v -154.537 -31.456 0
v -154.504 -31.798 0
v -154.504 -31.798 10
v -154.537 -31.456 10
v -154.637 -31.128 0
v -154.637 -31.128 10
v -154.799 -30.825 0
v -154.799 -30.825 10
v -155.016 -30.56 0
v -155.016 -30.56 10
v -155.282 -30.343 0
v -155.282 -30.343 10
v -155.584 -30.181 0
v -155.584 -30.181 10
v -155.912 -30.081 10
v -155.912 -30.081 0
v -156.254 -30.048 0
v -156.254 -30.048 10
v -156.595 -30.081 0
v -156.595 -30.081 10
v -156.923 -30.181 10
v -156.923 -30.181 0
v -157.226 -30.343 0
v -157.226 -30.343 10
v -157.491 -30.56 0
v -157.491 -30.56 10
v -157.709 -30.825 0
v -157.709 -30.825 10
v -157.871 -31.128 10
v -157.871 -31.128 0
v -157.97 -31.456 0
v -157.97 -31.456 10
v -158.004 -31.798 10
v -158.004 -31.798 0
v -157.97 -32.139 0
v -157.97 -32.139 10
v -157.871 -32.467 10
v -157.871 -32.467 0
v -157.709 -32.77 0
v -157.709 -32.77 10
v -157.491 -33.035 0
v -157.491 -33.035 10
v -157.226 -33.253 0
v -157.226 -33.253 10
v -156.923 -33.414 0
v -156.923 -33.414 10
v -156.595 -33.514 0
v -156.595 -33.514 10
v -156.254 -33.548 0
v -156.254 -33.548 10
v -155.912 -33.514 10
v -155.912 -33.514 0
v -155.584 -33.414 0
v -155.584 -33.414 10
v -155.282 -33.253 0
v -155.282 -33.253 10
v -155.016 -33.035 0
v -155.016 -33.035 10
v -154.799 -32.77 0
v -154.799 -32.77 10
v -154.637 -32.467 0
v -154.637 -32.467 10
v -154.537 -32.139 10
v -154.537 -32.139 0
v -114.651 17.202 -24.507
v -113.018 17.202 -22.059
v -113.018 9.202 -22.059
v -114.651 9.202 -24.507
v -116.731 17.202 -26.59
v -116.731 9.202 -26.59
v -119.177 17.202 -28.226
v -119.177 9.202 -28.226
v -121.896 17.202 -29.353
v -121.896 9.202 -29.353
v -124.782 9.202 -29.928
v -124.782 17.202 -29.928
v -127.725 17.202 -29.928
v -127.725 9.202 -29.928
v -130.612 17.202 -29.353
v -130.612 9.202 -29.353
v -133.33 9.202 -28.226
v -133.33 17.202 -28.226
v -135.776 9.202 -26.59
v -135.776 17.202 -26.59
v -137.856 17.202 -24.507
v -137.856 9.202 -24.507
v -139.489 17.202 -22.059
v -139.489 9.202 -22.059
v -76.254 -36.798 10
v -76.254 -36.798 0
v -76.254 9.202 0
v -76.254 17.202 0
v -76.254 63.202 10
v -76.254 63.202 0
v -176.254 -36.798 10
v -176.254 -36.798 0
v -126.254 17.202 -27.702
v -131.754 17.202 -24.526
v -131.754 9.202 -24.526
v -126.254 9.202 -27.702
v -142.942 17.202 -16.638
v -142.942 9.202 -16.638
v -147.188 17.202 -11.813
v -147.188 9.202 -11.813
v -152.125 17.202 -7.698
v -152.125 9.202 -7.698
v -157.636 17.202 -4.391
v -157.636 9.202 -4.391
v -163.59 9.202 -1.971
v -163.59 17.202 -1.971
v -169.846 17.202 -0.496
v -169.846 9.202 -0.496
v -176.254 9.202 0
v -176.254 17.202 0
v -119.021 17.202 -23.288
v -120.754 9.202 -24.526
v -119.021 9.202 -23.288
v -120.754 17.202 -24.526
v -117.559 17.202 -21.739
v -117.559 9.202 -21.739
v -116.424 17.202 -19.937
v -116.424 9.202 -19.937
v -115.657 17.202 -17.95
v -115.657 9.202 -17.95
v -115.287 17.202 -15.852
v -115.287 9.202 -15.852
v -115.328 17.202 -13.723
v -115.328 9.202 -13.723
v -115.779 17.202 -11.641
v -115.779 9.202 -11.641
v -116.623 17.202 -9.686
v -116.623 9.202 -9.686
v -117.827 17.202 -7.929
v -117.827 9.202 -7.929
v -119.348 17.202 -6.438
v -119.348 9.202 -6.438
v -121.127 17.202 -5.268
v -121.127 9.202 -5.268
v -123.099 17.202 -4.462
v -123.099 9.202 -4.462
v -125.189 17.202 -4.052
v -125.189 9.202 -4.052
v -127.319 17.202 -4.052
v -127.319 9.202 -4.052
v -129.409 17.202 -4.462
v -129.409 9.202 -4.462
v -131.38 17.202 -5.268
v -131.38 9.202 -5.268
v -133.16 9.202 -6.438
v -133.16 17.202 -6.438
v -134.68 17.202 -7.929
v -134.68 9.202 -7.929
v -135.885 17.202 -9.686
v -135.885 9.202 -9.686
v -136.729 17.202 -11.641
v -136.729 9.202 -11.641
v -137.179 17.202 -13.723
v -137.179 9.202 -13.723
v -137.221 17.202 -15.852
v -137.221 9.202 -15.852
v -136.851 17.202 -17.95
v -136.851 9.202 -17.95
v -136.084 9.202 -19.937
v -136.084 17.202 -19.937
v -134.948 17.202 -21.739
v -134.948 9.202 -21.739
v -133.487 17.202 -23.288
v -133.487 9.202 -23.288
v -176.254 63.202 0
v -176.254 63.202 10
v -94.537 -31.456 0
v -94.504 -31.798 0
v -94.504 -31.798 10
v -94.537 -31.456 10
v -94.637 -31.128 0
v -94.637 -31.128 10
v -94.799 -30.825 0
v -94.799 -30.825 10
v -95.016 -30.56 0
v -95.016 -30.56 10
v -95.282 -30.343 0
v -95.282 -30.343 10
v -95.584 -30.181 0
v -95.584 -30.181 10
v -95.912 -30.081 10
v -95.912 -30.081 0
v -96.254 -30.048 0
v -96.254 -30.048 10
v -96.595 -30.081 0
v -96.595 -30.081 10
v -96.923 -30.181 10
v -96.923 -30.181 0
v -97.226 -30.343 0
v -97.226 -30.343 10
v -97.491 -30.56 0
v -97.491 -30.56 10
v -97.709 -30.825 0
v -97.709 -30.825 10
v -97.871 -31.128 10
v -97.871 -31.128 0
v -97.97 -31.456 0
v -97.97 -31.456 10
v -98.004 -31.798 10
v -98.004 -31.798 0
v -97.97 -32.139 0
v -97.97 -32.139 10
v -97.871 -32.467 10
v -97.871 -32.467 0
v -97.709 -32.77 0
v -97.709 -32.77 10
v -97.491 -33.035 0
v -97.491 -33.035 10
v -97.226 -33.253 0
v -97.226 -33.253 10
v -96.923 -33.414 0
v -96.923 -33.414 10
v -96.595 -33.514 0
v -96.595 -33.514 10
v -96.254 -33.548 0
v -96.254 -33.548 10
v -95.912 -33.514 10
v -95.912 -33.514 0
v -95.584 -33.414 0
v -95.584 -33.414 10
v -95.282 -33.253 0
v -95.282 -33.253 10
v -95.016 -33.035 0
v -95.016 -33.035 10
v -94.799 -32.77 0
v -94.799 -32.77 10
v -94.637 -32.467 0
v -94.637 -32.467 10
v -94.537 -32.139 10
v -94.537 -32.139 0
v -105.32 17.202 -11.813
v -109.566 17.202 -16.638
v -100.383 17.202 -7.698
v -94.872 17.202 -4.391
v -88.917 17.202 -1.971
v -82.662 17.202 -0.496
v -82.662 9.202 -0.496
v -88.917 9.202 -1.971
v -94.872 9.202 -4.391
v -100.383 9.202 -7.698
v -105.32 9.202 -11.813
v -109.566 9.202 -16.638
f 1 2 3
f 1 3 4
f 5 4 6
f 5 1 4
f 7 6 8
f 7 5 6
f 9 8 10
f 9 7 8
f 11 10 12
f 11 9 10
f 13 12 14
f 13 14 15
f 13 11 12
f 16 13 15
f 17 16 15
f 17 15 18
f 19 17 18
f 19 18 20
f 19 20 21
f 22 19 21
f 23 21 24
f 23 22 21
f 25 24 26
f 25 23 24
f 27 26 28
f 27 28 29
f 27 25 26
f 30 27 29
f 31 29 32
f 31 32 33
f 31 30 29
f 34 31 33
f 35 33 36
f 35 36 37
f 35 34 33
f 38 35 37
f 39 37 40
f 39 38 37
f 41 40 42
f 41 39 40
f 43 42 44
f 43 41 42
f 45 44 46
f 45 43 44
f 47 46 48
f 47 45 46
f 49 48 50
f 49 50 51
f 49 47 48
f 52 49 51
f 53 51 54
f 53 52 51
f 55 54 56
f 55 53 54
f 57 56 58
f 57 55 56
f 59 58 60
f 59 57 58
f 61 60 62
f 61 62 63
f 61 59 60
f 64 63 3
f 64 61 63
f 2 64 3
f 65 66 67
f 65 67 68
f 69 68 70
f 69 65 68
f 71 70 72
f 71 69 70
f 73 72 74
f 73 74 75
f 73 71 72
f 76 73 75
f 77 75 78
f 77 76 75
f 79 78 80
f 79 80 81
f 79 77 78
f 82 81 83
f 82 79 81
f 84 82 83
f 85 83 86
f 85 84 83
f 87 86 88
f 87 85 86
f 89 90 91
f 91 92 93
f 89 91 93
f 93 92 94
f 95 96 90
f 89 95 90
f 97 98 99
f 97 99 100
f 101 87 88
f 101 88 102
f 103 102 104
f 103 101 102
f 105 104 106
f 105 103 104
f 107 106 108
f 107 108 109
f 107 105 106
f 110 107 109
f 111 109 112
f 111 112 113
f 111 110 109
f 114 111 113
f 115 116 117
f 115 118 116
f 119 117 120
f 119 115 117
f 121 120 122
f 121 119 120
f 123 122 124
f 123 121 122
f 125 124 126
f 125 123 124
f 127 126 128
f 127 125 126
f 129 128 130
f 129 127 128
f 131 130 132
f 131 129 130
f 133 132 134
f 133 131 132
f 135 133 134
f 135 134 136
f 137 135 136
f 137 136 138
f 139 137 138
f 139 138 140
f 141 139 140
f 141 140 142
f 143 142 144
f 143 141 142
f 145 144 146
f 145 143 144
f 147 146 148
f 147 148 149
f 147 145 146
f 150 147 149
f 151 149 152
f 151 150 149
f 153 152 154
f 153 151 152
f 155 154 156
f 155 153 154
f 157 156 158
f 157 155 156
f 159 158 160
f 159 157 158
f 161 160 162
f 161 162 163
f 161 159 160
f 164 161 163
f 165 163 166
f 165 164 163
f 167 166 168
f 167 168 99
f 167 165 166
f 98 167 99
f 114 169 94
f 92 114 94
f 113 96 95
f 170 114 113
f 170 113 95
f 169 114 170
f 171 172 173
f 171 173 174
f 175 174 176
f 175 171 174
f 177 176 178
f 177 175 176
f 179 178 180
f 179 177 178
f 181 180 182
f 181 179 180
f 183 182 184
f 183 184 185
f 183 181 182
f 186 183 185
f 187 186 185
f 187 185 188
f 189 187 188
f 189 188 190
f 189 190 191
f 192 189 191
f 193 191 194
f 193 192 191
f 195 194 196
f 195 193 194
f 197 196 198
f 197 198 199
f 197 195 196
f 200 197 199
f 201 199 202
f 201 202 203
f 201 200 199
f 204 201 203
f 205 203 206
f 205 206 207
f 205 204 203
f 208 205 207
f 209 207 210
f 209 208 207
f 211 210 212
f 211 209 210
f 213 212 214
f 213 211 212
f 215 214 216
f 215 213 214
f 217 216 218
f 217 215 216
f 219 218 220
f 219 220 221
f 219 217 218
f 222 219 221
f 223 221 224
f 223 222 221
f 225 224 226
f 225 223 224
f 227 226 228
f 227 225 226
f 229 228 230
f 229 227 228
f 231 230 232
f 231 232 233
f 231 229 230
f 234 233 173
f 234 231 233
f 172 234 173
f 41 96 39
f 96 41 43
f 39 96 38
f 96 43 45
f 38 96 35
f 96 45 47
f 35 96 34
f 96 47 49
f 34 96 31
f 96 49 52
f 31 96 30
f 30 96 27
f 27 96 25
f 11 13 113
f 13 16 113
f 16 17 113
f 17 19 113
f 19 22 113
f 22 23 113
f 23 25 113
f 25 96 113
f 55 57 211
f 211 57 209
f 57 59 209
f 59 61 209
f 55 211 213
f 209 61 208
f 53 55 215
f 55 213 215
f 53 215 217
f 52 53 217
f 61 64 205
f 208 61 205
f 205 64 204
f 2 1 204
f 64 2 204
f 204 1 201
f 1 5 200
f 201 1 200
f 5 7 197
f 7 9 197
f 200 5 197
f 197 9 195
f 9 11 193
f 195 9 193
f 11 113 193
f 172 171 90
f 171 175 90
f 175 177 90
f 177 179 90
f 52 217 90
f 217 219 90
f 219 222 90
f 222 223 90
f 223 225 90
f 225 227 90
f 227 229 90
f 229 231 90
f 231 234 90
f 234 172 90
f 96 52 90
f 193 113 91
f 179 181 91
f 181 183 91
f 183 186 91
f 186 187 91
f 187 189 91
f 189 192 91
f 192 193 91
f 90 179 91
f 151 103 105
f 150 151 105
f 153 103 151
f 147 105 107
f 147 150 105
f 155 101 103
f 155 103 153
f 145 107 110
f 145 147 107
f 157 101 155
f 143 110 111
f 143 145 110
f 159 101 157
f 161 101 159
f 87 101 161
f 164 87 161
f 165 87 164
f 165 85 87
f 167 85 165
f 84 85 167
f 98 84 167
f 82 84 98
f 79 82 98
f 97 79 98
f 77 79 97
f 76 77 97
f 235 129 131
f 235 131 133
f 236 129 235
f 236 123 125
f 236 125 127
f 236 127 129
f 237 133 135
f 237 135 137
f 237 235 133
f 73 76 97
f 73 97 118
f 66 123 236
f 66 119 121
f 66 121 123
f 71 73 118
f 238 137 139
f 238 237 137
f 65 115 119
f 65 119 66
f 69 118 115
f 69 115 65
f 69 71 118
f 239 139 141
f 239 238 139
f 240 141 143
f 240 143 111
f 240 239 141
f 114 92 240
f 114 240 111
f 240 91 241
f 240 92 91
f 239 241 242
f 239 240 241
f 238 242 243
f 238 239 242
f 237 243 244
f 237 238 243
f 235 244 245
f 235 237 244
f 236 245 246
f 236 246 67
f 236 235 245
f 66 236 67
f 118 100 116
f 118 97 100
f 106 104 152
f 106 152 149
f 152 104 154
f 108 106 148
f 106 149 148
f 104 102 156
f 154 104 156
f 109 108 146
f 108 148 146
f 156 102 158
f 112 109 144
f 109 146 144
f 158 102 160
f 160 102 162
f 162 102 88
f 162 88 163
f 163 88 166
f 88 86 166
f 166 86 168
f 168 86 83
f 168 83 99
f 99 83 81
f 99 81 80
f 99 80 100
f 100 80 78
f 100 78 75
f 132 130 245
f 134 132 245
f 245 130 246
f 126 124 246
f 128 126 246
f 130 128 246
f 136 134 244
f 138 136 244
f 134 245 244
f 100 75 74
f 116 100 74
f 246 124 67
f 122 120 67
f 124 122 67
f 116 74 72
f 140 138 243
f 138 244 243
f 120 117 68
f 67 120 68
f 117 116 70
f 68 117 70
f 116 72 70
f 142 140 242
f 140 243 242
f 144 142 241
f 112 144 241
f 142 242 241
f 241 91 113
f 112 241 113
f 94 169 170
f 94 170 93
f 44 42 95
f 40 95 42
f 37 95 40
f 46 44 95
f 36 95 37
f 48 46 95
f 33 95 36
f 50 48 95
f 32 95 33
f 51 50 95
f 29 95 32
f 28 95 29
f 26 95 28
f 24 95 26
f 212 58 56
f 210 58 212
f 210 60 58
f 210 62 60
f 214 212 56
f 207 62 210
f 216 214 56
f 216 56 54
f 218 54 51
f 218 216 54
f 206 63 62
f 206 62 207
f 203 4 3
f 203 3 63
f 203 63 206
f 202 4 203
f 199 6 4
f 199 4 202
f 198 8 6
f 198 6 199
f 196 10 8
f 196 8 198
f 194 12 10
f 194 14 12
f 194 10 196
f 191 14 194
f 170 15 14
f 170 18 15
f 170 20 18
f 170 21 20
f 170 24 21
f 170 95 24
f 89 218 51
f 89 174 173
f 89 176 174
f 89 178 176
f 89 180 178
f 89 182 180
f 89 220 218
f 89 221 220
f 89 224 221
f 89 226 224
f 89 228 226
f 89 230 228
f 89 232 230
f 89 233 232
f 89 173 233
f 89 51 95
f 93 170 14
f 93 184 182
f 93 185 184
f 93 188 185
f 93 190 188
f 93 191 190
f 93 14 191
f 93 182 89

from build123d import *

# Parameters (mm, degrees)
SKETCH1_W           = 100
SKETCH1_H           = 100
SKETCH1_R           = 1.75
BOSS_EXTRUDE1_DEPTH = 10
BOSS_EXTRUDE2_DEPTH = 4


with BuildPart() as part:
    # Sketch1 → Boss-Extrude1 (new body)
    with BuildSketch(Plane.XY):
        with Locations((-126.253776435, 13.202416918)):
            Rectangle(SKETCH1_W, SKETCH1_H)
        with Locations((-156.253776435, -31.797583082)):
            Circle(SKETCH1_R, mode=Mode.SUBTRACT)
        with Locations((-96.253776435, -31.797583082)):
            Circle(SKETCH1_R, mode=Mode.SUBTRACT)
    extrude(amount=BOSS_EXTRUDE1_DEPTH)

    # Sketch2 → Boss-Extrude2 (add, symmetric)
    with BuildSketch(Plane(origin=(0, 13.202416918, 0), x_dir=(1, 0, 0), z_dir=(0, 1, 0))):
        with BuildLine():
            ThreePointArc((-76.253776435, 0), (-97.691099578, 5.937794762), (-113.018482317, 22.058823529))
            ThreePointArc((-113.018482317, 22.058823529), (-126.253776435, 30), (-139.489070553, 22.058823529))
            ThreePointArc((-139.489070553, 22.058823529), (-154.816453292, 5.937794762), (-176.253776435, 0))
            Line((-176.253776435, 0), (-76.253776435, 0))
        make_face()
        with BuildLine():
            Line((-131.753776435, 24.526279442), (-126.253776435, 27.701705922))
            Line((-126.253776435, 27.701705922), (-120.753776435, 24.526279442))
            ThreePointArc((-120.753776435, 24.526279442), (-126.253776435, 4), (-131.753776435, 24.526279442))
        make_face(mode=Mode.SUBTRACT)
    extrude(amount=BOSS_EXTRUDE2_DEPTH, both=True)


solid = part.part
